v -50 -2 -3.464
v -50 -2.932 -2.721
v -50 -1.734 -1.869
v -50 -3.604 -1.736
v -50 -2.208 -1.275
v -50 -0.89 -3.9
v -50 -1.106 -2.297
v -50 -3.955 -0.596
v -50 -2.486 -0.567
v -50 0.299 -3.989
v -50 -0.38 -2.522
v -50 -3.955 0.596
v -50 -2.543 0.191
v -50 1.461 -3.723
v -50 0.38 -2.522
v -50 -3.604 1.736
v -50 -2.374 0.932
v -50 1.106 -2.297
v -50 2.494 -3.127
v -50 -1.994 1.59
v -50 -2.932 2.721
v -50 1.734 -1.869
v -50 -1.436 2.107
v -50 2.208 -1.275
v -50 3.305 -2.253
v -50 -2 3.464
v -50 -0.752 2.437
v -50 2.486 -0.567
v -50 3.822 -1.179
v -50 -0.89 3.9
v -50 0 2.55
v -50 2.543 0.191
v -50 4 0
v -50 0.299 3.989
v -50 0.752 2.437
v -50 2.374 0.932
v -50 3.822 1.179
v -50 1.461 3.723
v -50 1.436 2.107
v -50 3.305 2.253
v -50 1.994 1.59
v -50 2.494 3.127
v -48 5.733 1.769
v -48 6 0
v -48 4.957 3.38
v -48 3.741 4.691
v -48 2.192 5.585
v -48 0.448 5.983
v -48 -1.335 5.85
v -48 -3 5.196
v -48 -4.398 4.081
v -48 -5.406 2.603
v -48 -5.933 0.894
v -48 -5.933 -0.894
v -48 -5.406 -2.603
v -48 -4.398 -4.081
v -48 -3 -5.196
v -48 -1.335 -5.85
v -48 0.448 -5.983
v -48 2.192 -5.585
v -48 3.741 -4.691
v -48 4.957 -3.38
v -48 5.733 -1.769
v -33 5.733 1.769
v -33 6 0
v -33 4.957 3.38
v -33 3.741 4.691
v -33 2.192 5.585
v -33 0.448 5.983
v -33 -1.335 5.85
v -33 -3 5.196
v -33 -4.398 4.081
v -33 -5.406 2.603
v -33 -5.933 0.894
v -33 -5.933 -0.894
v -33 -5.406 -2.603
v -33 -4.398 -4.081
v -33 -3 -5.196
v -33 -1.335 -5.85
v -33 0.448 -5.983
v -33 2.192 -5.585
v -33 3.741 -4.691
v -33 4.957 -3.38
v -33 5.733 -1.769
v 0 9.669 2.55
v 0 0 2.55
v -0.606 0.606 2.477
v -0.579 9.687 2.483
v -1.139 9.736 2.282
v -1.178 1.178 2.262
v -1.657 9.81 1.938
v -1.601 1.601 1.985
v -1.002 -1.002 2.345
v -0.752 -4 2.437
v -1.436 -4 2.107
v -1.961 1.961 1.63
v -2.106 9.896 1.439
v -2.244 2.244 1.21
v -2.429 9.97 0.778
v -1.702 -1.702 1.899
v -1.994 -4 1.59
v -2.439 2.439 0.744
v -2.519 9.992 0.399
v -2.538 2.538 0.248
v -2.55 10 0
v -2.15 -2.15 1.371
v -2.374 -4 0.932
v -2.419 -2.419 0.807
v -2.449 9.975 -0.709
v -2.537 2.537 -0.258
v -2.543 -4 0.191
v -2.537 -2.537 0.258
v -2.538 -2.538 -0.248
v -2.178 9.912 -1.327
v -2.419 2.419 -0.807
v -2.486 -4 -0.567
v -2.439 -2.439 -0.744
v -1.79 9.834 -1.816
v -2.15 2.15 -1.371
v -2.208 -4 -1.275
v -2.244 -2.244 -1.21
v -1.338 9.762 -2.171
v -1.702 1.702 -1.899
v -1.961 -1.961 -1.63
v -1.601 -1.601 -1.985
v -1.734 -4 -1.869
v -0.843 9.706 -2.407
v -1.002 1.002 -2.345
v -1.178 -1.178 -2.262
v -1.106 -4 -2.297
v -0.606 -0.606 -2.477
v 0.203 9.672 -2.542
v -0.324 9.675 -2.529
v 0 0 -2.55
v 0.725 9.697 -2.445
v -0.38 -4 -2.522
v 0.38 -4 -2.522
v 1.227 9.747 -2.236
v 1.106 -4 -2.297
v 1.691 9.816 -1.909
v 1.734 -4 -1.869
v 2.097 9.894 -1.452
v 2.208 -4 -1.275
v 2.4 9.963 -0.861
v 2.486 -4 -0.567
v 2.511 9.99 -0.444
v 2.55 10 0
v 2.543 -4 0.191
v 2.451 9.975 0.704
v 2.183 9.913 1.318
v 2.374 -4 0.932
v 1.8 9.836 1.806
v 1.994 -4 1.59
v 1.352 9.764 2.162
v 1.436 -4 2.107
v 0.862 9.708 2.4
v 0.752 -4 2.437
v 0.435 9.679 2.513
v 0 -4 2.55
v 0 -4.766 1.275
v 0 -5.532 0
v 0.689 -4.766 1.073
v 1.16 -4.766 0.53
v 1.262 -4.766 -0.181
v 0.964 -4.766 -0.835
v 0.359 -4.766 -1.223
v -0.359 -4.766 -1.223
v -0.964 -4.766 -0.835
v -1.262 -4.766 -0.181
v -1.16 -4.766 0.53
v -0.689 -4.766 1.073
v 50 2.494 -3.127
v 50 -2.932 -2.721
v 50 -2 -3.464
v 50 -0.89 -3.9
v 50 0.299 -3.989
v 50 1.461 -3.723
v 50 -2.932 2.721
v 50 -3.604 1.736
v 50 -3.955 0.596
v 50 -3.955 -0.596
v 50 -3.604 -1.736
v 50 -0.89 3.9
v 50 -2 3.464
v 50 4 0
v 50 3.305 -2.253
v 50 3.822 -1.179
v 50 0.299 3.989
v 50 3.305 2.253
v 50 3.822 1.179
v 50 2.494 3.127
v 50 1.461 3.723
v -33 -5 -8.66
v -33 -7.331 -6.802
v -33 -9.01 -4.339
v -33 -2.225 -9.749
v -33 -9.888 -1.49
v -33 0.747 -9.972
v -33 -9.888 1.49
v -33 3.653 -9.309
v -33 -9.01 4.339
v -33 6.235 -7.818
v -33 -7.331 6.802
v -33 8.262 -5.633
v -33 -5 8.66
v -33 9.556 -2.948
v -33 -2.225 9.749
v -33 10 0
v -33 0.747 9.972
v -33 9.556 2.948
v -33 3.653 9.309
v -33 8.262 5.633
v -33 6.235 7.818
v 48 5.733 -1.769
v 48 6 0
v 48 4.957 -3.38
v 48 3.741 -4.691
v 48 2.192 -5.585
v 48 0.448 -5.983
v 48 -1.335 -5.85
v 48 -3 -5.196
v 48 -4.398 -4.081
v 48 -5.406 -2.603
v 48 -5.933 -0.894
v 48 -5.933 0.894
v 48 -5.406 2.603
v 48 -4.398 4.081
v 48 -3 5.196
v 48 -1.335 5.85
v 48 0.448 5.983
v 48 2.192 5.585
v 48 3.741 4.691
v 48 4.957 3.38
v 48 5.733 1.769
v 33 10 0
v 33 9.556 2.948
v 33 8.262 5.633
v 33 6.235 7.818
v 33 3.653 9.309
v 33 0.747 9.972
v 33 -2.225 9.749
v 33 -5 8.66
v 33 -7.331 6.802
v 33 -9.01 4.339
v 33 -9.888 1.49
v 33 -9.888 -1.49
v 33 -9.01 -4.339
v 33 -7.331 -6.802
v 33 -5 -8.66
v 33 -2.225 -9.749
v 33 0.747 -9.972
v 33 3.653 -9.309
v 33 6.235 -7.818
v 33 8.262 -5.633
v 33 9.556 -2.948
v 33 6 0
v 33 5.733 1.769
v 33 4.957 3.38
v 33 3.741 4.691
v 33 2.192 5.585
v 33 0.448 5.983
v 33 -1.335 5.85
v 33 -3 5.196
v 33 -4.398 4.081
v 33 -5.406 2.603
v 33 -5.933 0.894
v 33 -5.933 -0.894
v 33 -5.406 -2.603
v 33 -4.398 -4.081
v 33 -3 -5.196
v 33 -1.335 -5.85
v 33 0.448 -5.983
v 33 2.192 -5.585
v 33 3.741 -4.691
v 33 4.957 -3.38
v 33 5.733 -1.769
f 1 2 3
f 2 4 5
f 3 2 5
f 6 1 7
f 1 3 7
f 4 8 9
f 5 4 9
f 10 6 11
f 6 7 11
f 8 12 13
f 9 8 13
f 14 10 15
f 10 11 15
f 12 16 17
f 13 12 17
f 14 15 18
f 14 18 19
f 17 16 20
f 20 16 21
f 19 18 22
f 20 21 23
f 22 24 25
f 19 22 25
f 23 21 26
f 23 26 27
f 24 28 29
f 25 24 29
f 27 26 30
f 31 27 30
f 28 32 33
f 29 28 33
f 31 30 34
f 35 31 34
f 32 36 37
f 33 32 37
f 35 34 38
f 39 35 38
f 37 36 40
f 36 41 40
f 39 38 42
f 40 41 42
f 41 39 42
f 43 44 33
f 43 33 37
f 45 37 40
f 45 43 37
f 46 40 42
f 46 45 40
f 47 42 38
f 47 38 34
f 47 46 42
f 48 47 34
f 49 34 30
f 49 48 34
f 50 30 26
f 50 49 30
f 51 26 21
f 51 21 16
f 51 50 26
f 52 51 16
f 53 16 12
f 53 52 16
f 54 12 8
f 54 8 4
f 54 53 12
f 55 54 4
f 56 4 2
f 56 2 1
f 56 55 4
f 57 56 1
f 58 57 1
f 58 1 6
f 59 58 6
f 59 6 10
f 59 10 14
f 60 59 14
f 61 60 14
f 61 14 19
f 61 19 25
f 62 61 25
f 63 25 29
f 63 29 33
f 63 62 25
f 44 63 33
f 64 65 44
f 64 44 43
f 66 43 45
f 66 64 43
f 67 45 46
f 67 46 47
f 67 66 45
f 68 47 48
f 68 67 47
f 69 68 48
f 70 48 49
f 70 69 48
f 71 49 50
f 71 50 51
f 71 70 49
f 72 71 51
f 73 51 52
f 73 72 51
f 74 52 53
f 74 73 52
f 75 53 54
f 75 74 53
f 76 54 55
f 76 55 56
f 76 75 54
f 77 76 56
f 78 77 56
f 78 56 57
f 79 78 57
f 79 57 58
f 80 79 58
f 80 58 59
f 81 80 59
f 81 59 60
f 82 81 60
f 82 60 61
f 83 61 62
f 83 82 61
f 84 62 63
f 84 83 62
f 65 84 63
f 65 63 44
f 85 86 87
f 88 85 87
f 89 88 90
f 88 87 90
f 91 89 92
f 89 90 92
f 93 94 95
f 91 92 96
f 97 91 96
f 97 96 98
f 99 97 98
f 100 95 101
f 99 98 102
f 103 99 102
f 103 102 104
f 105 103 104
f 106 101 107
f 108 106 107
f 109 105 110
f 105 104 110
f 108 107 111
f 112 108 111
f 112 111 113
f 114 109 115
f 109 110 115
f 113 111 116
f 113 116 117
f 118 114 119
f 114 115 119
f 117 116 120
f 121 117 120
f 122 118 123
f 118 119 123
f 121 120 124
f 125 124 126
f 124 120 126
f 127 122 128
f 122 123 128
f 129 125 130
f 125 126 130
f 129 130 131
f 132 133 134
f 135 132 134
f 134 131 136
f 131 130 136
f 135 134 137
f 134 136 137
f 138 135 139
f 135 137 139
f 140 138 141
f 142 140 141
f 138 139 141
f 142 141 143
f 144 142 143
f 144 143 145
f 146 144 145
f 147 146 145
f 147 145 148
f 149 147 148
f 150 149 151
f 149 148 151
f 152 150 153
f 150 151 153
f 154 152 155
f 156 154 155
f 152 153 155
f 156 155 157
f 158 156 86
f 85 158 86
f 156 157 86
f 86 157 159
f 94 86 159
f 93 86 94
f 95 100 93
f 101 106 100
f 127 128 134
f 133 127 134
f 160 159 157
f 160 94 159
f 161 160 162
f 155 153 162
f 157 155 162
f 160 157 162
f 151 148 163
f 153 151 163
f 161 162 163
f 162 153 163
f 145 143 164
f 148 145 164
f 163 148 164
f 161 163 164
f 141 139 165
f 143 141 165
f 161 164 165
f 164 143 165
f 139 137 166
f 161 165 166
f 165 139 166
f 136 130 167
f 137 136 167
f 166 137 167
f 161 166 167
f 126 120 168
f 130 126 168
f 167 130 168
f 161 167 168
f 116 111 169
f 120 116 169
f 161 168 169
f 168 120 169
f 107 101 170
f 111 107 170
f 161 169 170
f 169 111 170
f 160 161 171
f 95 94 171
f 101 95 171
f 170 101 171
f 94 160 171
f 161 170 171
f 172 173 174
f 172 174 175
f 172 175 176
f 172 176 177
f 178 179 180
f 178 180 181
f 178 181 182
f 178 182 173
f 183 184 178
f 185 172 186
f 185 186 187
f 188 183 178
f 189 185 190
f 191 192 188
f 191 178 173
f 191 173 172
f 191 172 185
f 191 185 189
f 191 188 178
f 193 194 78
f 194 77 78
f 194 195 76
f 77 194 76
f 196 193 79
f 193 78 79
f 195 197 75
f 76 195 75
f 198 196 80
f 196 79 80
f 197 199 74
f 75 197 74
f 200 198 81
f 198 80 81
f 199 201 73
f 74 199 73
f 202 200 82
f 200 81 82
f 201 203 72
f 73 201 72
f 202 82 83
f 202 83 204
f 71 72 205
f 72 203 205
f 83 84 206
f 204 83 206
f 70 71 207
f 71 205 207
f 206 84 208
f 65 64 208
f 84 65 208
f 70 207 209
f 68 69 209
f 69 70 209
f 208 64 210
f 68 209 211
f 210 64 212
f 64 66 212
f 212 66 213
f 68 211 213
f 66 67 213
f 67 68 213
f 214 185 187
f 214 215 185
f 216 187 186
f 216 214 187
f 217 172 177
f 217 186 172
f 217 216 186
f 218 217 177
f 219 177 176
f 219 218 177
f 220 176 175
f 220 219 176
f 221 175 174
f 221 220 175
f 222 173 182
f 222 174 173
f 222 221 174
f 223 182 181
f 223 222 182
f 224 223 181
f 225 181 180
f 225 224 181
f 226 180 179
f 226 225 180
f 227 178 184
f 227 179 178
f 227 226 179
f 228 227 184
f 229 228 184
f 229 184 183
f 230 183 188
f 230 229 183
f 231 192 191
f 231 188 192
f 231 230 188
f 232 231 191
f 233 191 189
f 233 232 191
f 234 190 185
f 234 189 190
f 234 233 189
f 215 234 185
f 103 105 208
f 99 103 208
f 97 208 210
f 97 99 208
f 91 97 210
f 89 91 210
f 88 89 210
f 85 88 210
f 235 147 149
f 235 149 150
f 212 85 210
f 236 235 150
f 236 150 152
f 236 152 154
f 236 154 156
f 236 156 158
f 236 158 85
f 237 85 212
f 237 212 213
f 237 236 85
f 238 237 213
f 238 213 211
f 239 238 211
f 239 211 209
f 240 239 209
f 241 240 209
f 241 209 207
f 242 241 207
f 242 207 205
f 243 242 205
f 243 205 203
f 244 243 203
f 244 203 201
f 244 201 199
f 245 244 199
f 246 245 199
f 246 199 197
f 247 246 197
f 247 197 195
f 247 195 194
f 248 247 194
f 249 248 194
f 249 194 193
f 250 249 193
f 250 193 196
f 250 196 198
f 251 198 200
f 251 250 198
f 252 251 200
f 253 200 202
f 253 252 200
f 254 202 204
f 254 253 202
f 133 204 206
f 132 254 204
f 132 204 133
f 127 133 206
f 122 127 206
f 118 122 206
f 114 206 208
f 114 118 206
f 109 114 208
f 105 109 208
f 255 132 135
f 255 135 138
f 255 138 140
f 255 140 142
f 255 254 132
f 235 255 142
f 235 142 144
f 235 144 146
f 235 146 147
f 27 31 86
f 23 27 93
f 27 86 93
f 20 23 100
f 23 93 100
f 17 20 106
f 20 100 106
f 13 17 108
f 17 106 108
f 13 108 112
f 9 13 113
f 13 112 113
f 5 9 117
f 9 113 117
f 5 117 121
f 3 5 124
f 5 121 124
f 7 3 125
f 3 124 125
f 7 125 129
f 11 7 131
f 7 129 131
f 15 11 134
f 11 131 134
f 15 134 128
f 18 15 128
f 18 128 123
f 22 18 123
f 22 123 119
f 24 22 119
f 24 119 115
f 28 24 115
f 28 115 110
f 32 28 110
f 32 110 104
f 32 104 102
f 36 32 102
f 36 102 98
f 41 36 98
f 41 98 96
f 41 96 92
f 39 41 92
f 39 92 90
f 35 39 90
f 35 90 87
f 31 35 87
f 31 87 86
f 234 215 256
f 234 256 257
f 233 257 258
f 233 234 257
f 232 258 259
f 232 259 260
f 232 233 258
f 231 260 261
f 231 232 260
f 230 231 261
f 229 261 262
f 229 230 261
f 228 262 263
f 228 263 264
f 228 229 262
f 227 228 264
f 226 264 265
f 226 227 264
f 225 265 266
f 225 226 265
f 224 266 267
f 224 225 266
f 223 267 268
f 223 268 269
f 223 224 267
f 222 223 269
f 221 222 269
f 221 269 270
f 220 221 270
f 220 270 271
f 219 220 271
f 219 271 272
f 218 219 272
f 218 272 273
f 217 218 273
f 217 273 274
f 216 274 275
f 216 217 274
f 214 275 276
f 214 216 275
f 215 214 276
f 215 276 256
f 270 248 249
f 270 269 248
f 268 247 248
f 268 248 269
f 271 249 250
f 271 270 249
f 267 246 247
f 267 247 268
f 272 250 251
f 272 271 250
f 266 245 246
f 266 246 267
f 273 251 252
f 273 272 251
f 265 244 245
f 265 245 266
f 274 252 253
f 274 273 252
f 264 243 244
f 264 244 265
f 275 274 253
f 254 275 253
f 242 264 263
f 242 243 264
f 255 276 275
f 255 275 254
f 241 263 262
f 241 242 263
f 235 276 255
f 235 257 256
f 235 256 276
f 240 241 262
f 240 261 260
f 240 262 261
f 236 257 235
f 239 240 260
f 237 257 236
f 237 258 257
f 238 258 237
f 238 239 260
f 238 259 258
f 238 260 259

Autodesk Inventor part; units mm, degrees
ref_plane "YZ Plane" through (0, 0, 0) normal (1, 0, 0) x (0, 1, 0)
ref_plane "XY Plane" through (0, 0, 0) normal (0, 0, 1) x (1, 0, 0)
sketch "Sketch1" plane through (0, 0, 0) normal (0, 0, 1) x (1, 0, 0)
  line L0 (-50, 0) -> (0, 0)
  line L1 (0, 0) -> (50, 0)
  line L2 (-50, 0) -> (-50, 6)
  line L3 (-50, 6) -> (-33, 6)
  line L4 (-33, 6) -> (-33, 10)
  line L5 (-33, 10) -> (33, 10)
  line L6 (33, 10) -> (33, 6)
  line L7 (33, 6) -> (50, 6)
  line L8 (50, 6) -> (50, 0)
  point P0 (-33, 8)
  dimension "d0" = 100
  dimension "d1" = 12
  dimension "d2" = 20
  dimension "d3" = 17
  dimension "d4" = 83
revolve "Revolution1" add sketch "Sketch1" angle 360 about axis through (-50, 0, 0) along (1, 0, 0)
sketch "Sketch2" plane through (-50, 0, 0) normal (-1, 0, 0) x (0, 0, 1)
  circle A0 centre (0, 0) radius 6 projected
hole "Hole1" at (-50, 0, 0) direction (1, 0, 0) diameter 5.1 depth 50 tip angle 118
ref_plane "Work Plane1" through (0, 10, 0) normal (0, 1, 0) x (-1, 0, 0)
sketch "Sketch3" plane through (0, 10, 0) normal (0, 1, 0) x (-1, 0, 0)
  line L0 (50, 6) -> (50, -6) projected
  point P0 (0, 0)
  point P1 (0, 0)
  dimension "d13" = 50
hole "Hole2" at (0, 10, 0) direction (0, -1, 0) diameter 5.1 depth 14 tip angle 118
chamfer "Chamfer1" distance 2 angle 45 2 edges at (-50, -6, 0) (50, -6, 0)
properties part number "05-spindel" material "Stainless Steel"
